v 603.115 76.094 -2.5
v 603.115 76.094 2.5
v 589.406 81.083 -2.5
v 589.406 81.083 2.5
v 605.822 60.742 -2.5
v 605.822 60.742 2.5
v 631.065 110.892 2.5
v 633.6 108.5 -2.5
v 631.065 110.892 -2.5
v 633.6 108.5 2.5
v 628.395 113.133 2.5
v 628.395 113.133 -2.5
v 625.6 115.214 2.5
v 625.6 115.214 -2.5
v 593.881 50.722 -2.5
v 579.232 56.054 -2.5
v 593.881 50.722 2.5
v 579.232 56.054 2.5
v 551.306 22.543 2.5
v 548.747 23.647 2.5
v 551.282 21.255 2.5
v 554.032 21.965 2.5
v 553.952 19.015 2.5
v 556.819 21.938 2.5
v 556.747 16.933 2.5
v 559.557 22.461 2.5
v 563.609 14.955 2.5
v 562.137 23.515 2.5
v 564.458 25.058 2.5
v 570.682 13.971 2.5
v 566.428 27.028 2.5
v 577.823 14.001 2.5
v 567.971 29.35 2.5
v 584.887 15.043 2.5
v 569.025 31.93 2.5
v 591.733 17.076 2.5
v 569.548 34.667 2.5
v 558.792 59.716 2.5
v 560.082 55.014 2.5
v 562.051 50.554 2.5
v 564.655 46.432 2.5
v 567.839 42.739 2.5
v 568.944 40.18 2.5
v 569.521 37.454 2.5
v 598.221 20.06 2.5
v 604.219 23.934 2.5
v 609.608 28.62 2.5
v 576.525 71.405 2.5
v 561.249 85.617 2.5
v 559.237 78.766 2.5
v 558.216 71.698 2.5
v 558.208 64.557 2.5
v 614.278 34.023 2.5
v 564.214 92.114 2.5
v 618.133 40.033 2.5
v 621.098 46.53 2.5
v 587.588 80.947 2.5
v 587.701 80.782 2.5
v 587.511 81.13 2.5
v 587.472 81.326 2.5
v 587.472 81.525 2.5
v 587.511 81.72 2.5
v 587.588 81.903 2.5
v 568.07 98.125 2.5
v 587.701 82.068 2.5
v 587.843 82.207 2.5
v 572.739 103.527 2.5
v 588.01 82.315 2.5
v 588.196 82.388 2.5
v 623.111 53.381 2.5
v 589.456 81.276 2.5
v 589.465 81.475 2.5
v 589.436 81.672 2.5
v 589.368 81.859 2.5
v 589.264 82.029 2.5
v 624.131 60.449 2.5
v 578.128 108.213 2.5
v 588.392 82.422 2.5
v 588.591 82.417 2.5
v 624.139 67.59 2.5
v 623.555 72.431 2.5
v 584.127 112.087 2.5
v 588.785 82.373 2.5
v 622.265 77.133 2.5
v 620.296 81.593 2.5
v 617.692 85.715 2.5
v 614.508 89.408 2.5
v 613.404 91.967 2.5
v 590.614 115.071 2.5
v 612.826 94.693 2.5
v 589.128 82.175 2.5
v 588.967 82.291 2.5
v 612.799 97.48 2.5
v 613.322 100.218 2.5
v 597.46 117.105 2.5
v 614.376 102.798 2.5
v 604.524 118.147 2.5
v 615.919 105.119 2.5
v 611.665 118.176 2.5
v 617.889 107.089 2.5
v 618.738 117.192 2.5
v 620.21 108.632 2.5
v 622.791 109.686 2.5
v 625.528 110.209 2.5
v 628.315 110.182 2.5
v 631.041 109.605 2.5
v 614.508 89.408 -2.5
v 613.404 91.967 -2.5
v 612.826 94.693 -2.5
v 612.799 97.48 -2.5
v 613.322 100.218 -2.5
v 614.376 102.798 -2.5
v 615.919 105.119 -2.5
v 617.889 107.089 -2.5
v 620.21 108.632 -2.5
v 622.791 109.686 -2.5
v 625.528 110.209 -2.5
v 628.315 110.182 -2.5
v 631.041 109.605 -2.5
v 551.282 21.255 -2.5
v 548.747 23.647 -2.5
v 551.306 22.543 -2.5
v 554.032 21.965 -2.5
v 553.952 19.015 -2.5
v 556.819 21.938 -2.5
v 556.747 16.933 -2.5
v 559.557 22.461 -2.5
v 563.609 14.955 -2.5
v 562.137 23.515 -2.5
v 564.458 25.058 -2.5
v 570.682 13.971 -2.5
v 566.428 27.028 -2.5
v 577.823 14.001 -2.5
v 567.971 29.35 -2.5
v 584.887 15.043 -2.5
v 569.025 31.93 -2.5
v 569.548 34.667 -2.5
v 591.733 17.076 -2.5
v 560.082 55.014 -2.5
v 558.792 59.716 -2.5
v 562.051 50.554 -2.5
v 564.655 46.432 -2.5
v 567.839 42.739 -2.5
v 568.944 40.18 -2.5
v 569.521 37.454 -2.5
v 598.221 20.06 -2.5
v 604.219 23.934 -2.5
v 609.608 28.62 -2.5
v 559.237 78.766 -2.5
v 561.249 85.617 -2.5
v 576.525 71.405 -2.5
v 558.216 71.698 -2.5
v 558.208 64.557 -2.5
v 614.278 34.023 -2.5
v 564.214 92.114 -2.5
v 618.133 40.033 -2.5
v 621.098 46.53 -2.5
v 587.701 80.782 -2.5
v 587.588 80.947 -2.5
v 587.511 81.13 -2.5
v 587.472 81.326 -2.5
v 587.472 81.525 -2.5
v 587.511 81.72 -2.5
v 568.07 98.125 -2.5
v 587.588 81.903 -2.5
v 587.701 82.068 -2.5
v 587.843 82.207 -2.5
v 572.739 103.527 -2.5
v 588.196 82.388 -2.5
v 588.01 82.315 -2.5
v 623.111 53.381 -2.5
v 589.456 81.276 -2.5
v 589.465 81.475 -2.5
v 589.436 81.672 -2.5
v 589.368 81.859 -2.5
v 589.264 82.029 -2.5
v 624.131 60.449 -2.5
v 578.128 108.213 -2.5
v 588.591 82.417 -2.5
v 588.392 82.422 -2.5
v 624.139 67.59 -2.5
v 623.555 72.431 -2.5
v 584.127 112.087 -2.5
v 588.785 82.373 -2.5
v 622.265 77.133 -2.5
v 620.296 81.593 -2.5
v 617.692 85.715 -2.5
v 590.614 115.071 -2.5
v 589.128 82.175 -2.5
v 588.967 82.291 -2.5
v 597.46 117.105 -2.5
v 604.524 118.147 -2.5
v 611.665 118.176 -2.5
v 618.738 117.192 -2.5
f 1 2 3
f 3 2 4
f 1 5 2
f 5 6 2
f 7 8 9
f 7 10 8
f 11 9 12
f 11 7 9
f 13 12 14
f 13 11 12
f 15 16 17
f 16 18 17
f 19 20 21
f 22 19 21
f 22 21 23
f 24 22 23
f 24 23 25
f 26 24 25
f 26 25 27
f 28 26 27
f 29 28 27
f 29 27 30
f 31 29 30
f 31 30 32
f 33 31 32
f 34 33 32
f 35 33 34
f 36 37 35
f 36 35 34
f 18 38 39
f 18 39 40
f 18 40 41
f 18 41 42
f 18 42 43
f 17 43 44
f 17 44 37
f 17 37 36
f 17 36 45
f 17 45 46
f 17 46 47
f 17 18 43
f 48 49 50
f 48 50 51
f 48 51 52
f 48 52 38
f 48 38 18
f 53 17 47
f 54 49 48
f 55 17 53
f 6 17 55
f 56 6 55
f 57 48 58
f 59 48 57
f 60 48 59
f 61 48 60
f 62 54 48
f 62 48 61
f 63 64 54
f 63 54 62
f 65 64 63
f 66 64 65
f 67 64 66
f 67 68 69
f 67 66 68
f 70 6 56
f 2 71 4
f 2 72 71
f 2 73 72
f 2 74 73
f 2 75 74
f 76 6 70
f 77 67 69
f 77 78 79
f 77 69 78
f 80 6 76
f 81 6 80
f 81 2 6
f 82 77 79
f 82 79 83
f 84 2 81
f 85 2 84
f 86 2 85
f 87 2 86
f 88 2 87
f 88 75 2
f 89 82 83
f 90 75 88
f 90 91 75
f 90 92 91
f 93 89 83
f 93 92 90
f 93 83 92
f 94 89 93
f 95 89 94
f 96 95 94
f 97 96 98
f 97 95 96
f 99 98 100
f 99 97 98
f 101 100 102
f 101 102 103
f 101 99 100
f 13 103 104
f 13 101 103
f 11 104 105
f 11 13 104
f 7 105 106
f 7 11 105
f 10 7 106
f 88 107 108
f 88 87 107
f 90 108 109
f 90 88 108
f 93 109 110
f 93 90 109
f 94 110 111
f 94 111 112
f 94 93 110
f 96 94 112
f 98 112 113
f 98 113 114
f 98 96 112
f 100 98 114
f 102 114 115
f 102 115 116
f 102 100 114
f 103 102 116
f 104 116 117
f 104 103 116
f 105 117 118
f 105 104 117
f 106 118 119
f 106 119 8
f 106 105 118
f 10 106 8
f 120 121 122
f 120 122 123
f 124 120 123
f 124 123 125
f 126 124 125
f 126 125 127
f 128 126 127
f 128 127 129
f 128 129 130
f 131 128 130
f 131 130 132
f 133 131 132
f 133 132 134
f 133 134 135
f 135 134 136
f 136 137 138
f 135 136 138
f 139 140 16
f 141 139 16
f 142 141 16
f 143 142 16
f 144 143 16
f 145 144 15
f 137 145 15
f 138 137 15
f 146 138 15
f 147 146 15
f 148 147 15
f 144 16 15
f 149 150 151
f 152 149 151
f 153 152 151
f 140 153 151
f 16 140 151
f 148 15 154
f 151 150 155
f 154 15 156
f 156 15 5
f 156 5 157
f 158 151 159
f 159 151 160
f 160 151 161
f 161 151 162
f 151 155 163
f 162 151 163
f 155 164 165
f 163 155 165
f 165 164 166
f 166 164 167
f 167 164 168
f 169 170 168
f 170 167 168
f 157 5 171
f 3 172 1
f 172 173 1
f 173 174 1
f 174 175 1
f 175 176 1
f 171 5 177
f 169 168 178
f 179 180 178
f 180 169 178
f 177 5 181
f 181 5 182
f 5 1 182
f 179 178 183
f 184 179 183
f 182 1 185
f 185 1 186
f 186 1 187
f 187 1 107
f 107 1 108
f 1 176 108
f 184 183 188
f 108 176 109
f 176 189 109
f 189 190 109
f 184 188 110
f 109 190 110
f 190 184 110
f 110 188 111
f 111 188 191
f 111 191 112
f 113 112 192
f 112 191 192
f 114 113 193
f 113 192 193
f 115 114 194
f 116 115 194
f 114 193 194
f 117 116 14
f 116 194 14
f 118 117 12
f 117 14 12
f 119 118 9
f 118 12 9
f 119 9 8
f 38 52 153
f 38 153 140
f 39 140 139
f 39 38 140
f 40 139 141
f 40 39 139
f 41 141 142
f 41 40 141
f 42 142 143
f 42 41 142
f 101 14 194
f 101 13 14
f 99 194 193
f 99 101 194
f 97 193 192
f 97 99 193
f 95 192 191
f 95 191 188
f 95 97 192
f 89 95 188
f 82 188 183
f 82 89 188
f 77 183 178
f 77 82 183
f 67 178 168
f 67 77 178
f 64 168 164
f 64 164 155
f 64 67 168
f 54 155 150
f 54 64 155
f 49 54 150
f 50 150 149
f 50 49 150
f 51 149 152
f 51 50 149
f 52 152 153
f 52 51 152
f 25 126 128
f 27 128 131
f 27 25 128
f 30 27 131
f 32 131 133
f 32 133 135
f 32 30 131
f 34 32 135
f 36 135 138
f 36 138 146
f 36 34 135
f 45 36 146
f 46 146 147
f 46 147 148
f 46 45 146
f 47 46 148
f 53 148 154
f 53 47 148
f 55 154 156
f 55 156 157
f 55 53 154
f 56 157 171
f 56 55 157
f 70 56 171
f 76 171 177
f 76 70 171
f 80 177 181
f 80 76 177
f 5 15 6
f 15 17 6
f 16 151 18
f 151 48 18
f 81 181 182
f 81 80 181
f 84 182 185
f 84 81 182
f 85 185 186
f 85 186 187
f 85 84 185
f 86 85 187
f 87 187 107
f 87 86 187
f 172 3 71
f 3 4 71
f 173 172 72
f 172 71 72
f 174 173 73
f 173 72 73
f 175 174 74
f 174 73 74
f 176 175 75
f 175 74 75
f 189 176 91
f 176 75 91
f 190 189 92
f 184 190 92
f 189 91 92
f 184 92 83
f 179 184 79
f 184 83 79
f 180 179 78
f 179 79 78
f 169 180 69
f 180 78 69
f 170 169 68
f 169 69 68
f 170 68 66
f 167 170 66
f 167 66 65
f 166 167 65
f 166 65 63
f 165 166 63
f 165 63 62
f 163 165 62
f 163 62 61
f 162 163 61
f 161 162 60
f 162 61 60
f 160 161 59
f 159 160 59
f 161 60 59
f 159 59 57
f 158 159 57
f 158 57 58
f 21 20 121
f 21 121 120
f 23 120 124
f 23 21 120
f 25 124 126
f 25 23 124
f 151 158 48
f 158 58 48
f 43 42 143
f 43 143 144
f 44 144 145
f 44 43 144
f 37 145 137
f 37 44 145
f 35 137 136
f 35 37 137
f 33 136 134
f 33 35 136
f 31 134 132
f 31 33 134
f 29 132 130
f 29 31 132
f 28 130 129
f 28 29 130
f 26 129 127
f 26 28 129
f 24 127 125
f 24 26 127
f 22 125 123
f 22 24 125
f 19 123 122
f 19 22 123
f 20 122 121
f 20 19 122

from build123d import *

# Parameters (mm, degrees)
BOSS_EXTRUDE1_DEPTH = 2.5


with BuildPart() as part:
    # Model → Boss-Extrude1 (new, symmetric)
    with BuildSketch(Plane.XY):
        with BuildLine():
            ThreePointArc((625.600029607, 115.214424851), (578.127821467, 108.213195948), (558.208452339, 64.557194238))
            ThreePointArc((558.208452339, 64.557194238), (560.983849767, 52.747710067), (567.839069353, 42.739078209))
            ThreePointArc((567.839069353, 42.739078209), (565.492156458, 25.994108012), (548.747186261, 23.647195117))
            ThreePointArc((548.747186261, 23.647195117), (552.600795358, 20.115585583), (556.747156658, 16.932779125))
            ThreePointArc((556.747156658, 16.932779125), (604.219364798, 23.934008028), (624.138733926, 67.590009739))
            ThreePointArc((624.138733926, 67.590009739), (621.363336499, 79.399493909), (614.508116912, 89.408125767))
            ThreePointArc((614.508116912, 89.408125767), (616.855029807, 106.153095964), (633.600000004, 108.500008859))
            ThreePointArc((633.600000004, 108.500008859), (629.746390907, 112.031618393), (625.600029607, 115.214424851))
        make_face()
        with BuildLine():
            Line((603.1150442, 76.093669174), (589.406378556, 81.08321542))
            ThreePointArc((589.406378556, 81.08321542), (588.293037758, 82.410043316), (587.700641492, 80.782447954))
            Line((587.700641492, 80.782447954), (576.525234868, 71.405168377))
            Line((576.525234868, 71.405168377), (579.232142066, 56.053534802))
            Line((579.232142066, 56.053534802), (593.88050033, 50.721968413))
            Line((593.88050033, 50.721968413), (605.821951397, 60.742035599))
            Line((605.821951397, 60.742035599), (603.1150442, 76.093669174))
        make_face(mode=Mode.SUBTRACT)
    extrude(amount=BOSS_EXTRUDE1_DEPTH, both=True)


solid = part.part
